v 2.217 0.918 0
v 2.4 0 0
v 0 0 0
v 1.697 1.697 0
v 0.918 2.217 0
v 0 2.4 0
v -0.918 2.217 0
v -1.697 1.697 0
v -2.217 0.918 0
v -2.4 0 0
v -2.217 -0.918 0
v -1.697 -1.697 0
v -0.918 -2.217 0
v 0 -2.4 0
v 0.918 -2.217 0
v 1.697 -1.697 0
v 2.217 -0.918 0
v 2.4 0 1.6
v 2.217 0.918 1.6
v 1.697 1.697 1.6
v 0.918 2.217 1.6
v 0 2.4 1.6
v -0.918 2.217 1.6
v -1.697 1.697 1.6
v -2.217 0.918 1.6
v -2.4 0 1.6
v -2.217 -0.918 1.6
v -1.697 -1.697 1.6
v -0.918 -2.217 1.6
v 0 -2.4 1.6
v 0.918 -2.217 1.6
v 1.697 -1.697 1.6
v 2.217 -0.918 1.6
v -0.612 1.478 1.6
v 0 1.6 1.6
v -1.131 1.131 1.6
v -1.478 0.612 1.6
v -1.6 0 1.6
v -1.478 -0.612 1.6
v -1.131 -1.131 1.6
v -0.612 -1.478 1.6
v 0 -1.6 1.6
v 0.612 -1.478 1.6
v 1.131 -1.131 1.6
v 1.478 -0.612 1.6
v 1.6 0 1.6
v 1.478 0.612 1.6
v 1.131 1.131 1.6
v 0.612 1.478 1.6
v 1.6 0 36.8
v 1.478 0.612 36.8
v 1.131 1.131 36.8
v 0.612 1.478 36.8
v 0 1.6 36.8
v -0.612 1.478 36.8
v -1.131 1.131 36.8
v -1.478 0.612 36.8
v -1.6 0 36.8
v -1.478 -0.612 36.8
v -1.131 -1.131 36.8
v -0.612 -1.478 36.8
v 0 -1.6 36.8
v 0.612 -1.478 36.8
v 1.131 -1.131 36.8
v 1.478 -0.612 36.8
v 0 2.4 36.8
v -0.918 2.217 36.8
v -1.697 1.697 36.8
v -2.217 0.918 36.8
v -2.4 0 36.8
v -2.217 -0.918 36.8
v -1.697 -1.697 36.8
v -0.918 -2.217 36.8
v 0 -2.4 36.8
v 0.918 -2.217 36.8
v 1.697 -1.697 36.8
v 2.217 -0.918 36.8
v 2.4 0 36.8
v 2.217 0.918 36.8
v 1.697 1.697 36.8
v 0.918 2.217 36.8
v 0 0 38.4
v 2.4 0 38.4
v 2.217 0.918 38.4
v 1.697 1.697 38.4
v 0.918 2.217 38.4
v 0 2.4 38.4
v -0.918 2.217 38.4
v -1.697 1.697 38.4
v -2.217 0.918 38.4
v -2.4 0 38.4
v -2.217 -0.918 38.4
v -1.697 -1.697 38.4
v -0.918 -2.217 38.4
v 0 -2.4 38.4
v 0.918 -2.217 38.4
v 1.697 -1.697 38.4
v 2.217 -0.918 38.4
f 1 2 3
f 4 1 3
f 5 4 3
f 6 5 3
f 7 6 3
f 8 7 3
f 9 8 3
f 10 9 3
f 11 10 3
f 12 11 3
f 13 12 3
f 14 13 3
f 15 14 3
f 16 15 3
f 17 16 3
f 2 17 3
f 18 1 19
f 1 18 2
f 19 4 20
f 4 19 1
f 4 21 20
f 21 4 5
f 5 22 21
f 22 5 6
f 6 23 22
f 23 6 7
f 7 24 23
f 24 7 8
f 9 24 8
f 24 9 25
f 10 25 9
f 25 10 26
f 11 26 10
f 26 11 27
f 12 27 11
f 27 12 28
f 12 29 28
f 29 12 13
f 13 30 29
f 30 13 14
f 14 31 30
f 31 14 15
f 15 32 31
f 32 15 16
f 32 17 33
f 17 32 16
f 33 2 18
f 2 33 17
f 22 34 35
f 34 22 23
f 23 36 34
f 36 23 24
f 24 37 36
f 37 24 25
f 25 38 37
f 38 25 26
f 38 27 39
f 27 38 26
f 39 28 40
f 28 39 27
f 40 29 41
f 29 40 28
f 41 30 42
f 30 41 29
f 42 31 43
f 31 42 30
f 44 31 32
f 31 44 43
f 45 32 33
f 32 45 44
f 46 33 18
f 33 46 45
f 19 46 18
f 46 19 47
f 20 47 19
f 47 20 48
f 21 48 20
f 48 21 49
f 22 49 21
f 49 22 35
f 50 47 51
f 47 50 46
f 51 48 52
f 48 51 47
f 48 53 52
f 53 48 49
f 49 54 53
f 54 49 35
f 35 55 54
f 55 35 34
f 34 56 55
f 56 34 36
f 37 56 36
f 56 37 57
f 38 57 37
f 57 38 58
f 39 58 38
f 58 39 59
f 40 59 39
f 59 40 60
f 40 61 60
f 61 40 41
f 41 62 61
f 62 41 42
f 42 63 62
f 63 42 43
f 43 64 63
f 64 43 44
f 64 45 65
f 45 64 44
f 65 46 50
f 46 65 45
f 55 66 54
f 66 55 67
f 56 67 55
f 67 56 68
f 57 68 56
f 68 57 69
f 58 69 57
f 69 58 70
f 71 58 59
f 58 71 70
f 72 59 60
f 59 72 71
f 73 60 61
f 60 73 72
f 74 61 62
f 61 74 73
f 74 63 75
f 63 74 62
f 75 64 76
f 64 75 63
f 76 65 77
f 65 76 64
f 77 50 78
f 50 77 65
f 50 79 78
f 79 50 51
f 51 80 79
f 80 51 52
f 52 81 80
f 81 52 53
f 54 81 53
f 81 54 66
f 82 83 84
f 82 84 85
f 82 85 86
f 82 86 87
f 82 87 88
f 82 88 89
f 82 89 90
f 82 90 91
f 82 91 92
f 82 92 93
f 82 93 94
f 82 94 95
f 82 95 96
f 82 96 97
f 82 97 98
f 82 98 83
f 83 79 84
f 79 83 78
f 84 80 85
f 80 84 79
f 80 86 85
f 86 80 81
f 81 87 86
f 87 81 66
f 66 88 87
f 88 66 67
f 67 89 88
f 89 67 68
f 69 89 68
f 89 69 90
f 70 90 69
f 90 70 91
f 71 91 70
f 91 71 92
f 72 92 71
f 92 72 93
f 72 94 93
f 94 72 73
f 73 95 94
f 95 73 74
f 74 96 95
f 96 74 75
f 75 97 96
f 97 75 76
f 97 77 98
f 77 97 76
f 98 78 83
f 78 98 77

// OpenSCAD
// file: ../p/4-4edge.scad
use <../lib.scad>
function ldraw_lib__4_4edge() = [
// 0 Circle 1.0
// 0 Name: 4-4edge.dat
// 0 Author: James Jessiman
// 0 !LDRAW_ORG Primitive UPDATE 2017-01
// 0 !LICENSE Licensed under CC BY 2.0 and CC BY 4.0 : see CAreadme.txt
// 
// 0 BFC CERTIFY CCW
  [0,"BFC","CERTIFY"],
  [0,"BFC","CCW"],
// 
// 0 !HISTORY 1998-12-15 [PTadmin] Official Update 1998-10
// 0 !HISTORY 2005-12-28 [PTadmin] Official Update 2005-01
// 0 !HISTORY 2007-06-24 [PTadmin] Header formatted for Contributor Agreement
// 0 !HISTORY 2008-07-01 [PTadmin] Official Update 2008-01
// 0 !HISTORY 2017-01-15 [Steffen] BFCed
// 0 !HISTORY 2017-12-30 [PTadmin] Official Update 2017-01
// 
// 
// 2 24 1 0 0 0.9239 0 0.3827
  [2,24,1,0,0,0.9239,0,0.3827],
// 2 24 0.9239 0 0.3827 0.7071 0 0.7071
  [2,24,0.9239,0,0.3827,0.7071,0,0.7071],
// 2 24 0.7071 0 0.7071 0.3827 0 0.9239
  [2,24,0.7071,0,0.7071,0.3827,0,0.9239],
// 2 24 0.3827 0 0.9239 0 0 1
  [2,24,0.3827,0,0.9239,0,0,1],
// 2 24 0 0 1 -0.3827 0 0.9239
  [2,24,0,0,1,-0.3827,0,0.9239],
// 2 24 -0.3827 0 0.9239 -0.7071 0 0.7071
  [2,24,-0.3827,0,0.9239,-0.7071,0,0.7071],
// 2 24 -0.7071 0 0.7071 -0.9239 0 0.3827
  [2,24,-0.7071,0,0.7071,-0.9239,0,0.3827],
// 2 24 -0.9239 0 0.3827 -1 0 -0
  [2,24,-0.9239,0,0.3827,-1,0,-0],
// 2 24 -1 0 -0 -0.9239 0 -0.3827
  [2,24,-1,0,-0,-0.9239,0,-0.3827],
// 2 24 -0.9239 0 -0.3827 -0.7071 0 -0.7071
  [2,24,-0.9239,0,-0.3827,-0.7071,0,-0.7071],
// 2 24 -0.7071 0 -0.7071 -0.3827 0 -0.9239
  [2,24,-0.7071,0,-0.7071,-0.3827,0,-0.9239],
// 2 24 -0.3827 0 -0.9239 0 0 -1
  [2,24,-0.3827,0,-0.9239,0,0,-1],
// 2 24 0 0 -1 0.3827 0 -0.9239
  [2,24,0,0,-1,0.3827,0,-0.9239],
// 2 24 0.3827 0 -0.9239 0.7071 0 -0.7071
  [2,24,0.3827,0,-0.9239,0.7071,0,-0.7071],
// 2 24 0.7071 0 -0.7071 0.9239 0 -0.3827
  [2,24,0.7071,0,-0.7071,0.9239,0,-0.3827],
// 2 24 0.9239 0 -0.3827 1 0 0
  [2,24,0.9239,0,-0.3827,1,0,0],
];
module ldraw_lib__4_4edge(step=0, col=false, unit=2/5, alt=false, line=0.2, solid=!$preview)
    makepoly(ldraw_lib__4_4edge(), step=step, col=col, unit=unit, alt=alt, line=line, solid=solid);
ldraw_lib__4_4edge(line=0.2);
// file: ../p/4-4disc.scad
use <../lib.scad>
function ldraw_lib__4_4disc() = [
// 0 Disc 1.0
// 0 Name: 4-4disc.dat
// 0 Author: James Jessiman
// 0 !LDRAW_ORG Primitive UPDATE 2002-02
// 0 !LICENSE Licensed under CC BY 2.0 and CC BY 4.0 : see CAreadme.txt
// 
// 0 BFC CERTIFY CCW
  [0,"BFC","CERTIFY"],
  [0,"BFC","CCW"],
// 
// 0 !HISTORY 1998-12-15 [PTadmin] Official Update 1998-10
// 0 !HISTORY 2002-03-23 [sbliss] Added BFC statement
// 0 !HISTORY 2002-04-25 [PTadmin] Official Update 2002-02
// 0 !HISTORY 2007-06-24 [PTadmin] Header formatted for Contributor Agreement
// 0 !HISTORY 2008-07-01 [PTadmin] Official Update 2008-01
// 
// 
// 3 16 0 0 0 1 0 0 0.9239 0 0.3827
  [3,16,0,0,0,1,0,0,0.9239,0,0.3827],
// 3 16 0 0 0 0.9239 0 0.3827 0.7071 0 0.7071
  [3,16,0,0,0,0.9239,0,0.3827,0.7071,0,0.7071],
// 3 16 0 0 0 0.7071 0 0.7071 0.3827 0 0.9239
  [3,16,0,0,0,0.7071,0,0.7071,0.3827,0,0.9239],
// 3 16 0 0 0 0.3827 0 0.9239 0 0 1
  [3,16,0,0,0,0.3827,0,0.9239,0,0,1],
// 3 16 0 0 0 0 0 1 -0.3827 0 0.9239
  [3,16,0,0,0,0,0,1,-0.3827,0,0.9239],
// 3 16 0 0 0 -0.3827 0 0.9239 -0.7071 0 0.7071
  [3,16,0,0,0,-0.3827,0,0.9239,-0.7071,0,0.7071],
// 3 16 0 0 0 -0.7071 0 0.7071 -0.9239 0 0.3827
  [3,16,0,0,0,-0.7071,0,0.7071,-0.9239,0,0.3827],
// 3 16 0 0 0 -0.9239 0 0.3827 -1 0 -0
  [3,16,0,0,0,-0.9239,0,0.3827,-1,0,-0],
// 3 16 0 0 0 -1 0 -0 -0.9239 0 -0.3827
  [3,16,0,0,0,-1,0,-0,-0.9239,0,-0.3827],
// 3 16 0 0 0 -0.9239 0 -0.3827 -0.7071 0 -0.7071
  [3,16,0,0,0,-0.9239,0,-0.3827,-0.7071,0,-0.7071],
// 3 16 0 0 0 -0.7071 0 -0.7071 -0.3827 0 -0.9239
  [3,16,0,0,0,-0.7071,0,-0.7071,-0.3827,0,-0.9239],
// 3 16 0 0 0 -0.3827 0 -0.9239 0 0 -1
  [3,16,0,0,0,-0.3827,0,-0.9239,0,0,-1],
// 3 16 0 0 0 0 0 -1 0.3827 0 -0.9239
  [3,16,0,0,0,0,0,-1,0.3827,0,-0.9239],
// 3 16 0 0 0 0.3827 0 -0.9239 0.7071 0 -0.7071
  [3,16,0,0,0,0.3827,0,-0.9239,0.7071,0,-0.7071],
// 3 16 0 0 0 0.7071 0 -0.7071 0.9239 0 -0.3827
  [3,16,0,0,0,0.7071,0,-0.7071,0.9239,0,-0.3827],
// 3 16 0 0 0 0.9239 0 -0.3827 1 0 0
  [3,16,0,0,0,0.9239,0,-0.3827,1,0,0],
// 0
];
module ldraw_lib__4_4disc(step=0, col=false, unit=2/5, alt=false, line=0.2, solid=!$preview)
    makepoly(ldraw_lib__4_4disc(), step=step, col=col, unit=unit, alt=alt, line=line, solid=solid);
ldraw_lib__4_4disc(line=0.2);
// file: ../p/4-4cyli.scad
use <../lib.scad>
function ldraw_lib__4_4cyli() = [
// 0 Cylinder 1.0
// 0 Name: 4-4cyli.dat
// 0 Author: James Jessiman
// 0 !LDRAW_ORG Primitive UPDATE 2005-01
// 0 !LICENSE Licensed under CC BY 2.0 and CC BY 4.0 : see CAreadme.txt
// 
// 0 BFC CERTIFY CCW
  [0,"BFC","CERTIFY"],
  [0,"BFC","CCW"],
// 
// 0 !HISTORY 1998-12-15 [PTadmin] Official Update 1998-10
// 0 !HISTORY 2002-03-23 [sbliss] Added BFC statement; merged headers from files in distributions LDraw 0.27 and Complete.
// 0 !HISTORY 2002-04-25 [PTadmin] Official Update 2002-02
// 0 !HISTORY 2004-12-14 [guyvivan] BFC CCW
// 0 !HISTORY 2005-12-28 [PTadmin] Official Update 2005-01
// 0 !HISTORY 2007-06-24 [PTadmin] Header formatted for Contributor Agreement
// 0 !HISTORY 2008-07-01 [PTadmin] Official Update 2008-01
// 
// 
// 4 16 1 1 0 0.9239 1 0.3827 0.9239 0 0.3827 1 0 0
  [4,16,1,1,0,0.9239,1,0.3827,0.9239,0,0.3827,1,0,0],
// 5 24 1 0 0 1 1 0 0.9239 0 0.3827 0.9239 0 -0.3827
  [5,24,1,0,0,1,1,0,0.9239,0,0.3827,0.9239,0,-0.3827],
// 4 16 0.9239 1 0.3827 0.7071 1 0.7071 0.7071 0 0.7071 0.9239 0 0.3827
  [4,16,0.9239,1,0.3827,0.7071,1,0.7071,0.7071,0,0.7071,0.9239,0,0.3827],
// 5 24 0.9239 0 0.3827 0.9239 1 0.3827 0.7071 0 0.7071 1 0 0
  [5,24,0.9239,0,0.3827,0.9239,1,0.3827,0.7071,0,0.7071,1,0,0],
// 4 16 0.7071 1 0.7071 0.3827 1 0.9239 0.3827 0 0.9239 0.7071 0 0.7071
  [4,16,0.7071,1,0.7071,0.3827,1,0.9239,0.3827,0,0.9239,0.7071,0,0.7071],
// 5 24 0.7071 0 0.7071 0.7071 1 0.7071 0.3827 0 0.9239 0.9239 0 0.3827
  [5,24,0.7071,0,0.7071,0.7071,1,0.7071,0.3827,0,0.9239,0.9239,0,0.3827],
// 4 16 0.3827 1 0.9239 0 1 1 0 0 1 0.3827 0 0.9239
  [4,16,0.3827,1,0.9239,0,1,1,0,0,1,0.3827,0,0.9239],
// 5 24 0.3827 0 0.9239 0.3827 1 0.9239 0 0 1 0.7071 0 0.7071
  [5,24,0.3827,0,0.9239,0.3827,1,0.9239,0,0,1,0.7071,0,0.7071],
// 4 16 0 1 1 -0.3827 1 0.9239 -0.3827 0 0.9239 0 0 1
  [4,16,0,1,1,-0.3827,1,0.9239,-0.3827,0,0.9239,0,0,1],
// 5 24 0 0 1 0 1 1 -0.3827 0 0.9239 0.3827 0 0.9239
  [5,24,0,0,1,0,1,1,-0.3827,0,0.9239,0.3827,0,0.9239],
// 4 16 -0.3827 1 0.9239 -0.7071 1 0.7071 -0.7071 0 0.7071 -0.3827 0 0.9239
  [4,16,-0.3827,1,0.9239,-0.7071,1,0.7071,-0.7071,0,0.7071,-0.3827,0,0.9239],
// 5 24 -0.3827 0 0.9239 -0.3827 1 0.9239 -0.7071 0 0.7071 0 0 1
  [5,24,-0.3827,0,0.9239,-0.3827,1,0.9239,-0.7071,0,0.7071,0,0,1],
// 4 16 -0.7071 1 0.7071 -0.9239 1 0.3827 -0.9239 0 0.3827 -0.7071 0 0.7071
  [4,16,-0.7071,1,0.7071,-0.9239,1,0.3827,-0.9239,0,0.3827,-0.7071,0,0.7071],
// 5 24 -0.7071 0 0.7071 -0.7071 1 0.7071 -0.9239 0 0.3827 -0.3827 0 0.9239
  [5,24,-0.7071,0,0.7071,-0.7071,1,0.7071,-0.9239,0,0.3827,-0.3827,0,0.9239],
// 4 16 -0.9239 1 0.3827 -1 1 0 -1 0 0 -0.9239 0 0.3827
  [4,16,-0.9239,1,0.3827,-1,1,0,-1,0,0,-0.9239,0,0.3827],
// 5 24 -0.9239 0 0.3827 -0.9239 1 0.3827 -1 0 0 -0.7071 0 0.7071
  [5,24,-0.9239,0,0.3827,-0.9239,1,0.3827,-1,0,0,-0.7071,0,0.7071],
// 4 16 -1 1 0 -0.9239 1 -0.3827 -0.9239 0 -0.3827 -1 0 0
  [4,16,-1,1,0,-0.9239,1,-0.3827,-0.9239,0,-0.3827,-1,0,0],
// 5 24 -1 0 0 -1 1 0 -0.9239 0 -0.3827 -0.9239 0 0.3827
  [5,24,-1,0,0,-1,1,0,-0.9239,0,-0.3827,-0.9239,0,0.3827],
// 4 16 -0.9239 1 -0.3827 -0.7071 1 -0.7071 -0.7071 0 -0.7071 -0.9239 0 -0.3827
  [4,16,-0.9239,1,-0.3827,-0.7071,1,-0.7071,-0.7071,0,-0.7071,-0.9239,0,-0.3827],
// 5 24 -0.9239 0 -0.3827 -0.9239 1 -0.3827 -0.7071 0 -0.7071 -1 0 0
  [5,24,-0.9239,0,-0.3827,-0.9239,1,-0.3827,-0.7071,0,-0.7071,-1,0,0],
// 4 16 -0.7071 1 -0.7071 -0.3827 1 -0.9239 -0.3827 0 -0.9239 -0.7071 0 -0.7071
  [4,16,-0.7071,1,-0.7071,-0.3827,1,-0.9239,-0.3827,0,-0.9239,-0.7071,0,-0.7071],
// 5 24 -0.7071 0 -0.7071 -0.7071 1 -0.7071 -0.3827 0 -0.9239 -0.9239 0 -0.3827
  [5,24,-0.7071,0,-0.7071,-0.7071,1,-0.7071,-0.3827,0,-0.9239,-0.9239,0,-0.3827],
// 4 16 -0.3827 1 -0.9239 0 1 -1 0 0 -1 -0.3827 0 -0.9239
  [4,16,-0.3827,1,-0.9239,0,1,-1,0,0,-1,-0.3827,0,-0.9239],
// 5 24 -0.3827 0 -0.9239 -0.3827 1 -0.9239 0 0 -1 -0.7071 0 -0.7071
  [5,24,-0.3827,0,-0.9239,-0.3827,1,-0.9239,0,0,-1,-0.7071,0,-0.7071],
// 4 16 0 1 -1 0.3827 1 -0.9239 0.3827 0 -0.9239 0 0 -1
  [4,16,0,1,-1,0.3827,1,-0.9239,0.3827,0,-0.9239,0,0,-1],
// 5 24 0 0 -1 0 1 -1 0.3827 0 -0.9239 -0.3827 0 -0.9239
  [5,24,0,0,-1,0,1,-1,0.3827,0,-0.9239,-0.3827,0,-0.9239],
// 4 16 0.3827 1 -0.9239 0.7071 1 -0.7071 0.7071 0 -0.7071 0.3827 0 -0.9239
  [4,16,0.3827,1,-0.9239,0.7071,1,-0.7071,0.7071,0,-0.7071,0.3827,0,-0.9239],
// 5 24 0.3827 0 -0.9239 0.3827 1 -0.9239 0.7071 0 -0.7071 0 0 -1
  [5,24,0.3827,0,-0.9239,0.3827,1,-0.9239,0.7071,0,-0.7071,0,0,-1],
// 4 16 0.7071 1 -0.7071 0.9239 1 -0.3827 0.9239 0 -0.3827 0.7071 0 -0.7071
  [4,16,0.7071,1,-0.7071,0.9239,1,-0.3827,0.9239,0,-0.3827,0.7071,0,-0.7071],
// 5 24 0.7071 0 -0.7071 0.7071 1 -0.7071 0.9239 0 -0.3827 0.3827 0 -0.9239
  [5,24,0.7071,0,-0.7071,0.7071,1,-0.7071,0.9239,0,-0.3827,0.3827,0,-0.9239],
// 4 16 0.9239 1 -0.3827 1 1 0 1 0 0 0.9239 0 -0.3827
  [4,16,0.9239,1,-0.3827,1,1,0,1,0,0,0.9239,0,-0.3827],
// 5 24 0.9239 0 -0.3827 0.9239 1 -0.3827 1 0 0 0.7071 0 -0.7071
  [5,24,0.9239,0,-0.3827,0.9239,1,-0.3827,1,0,0,0.7071,0,-0.7071],
// 0
];
module ldraw_lib__4_4cyli(step=0, col=false, unit=2/5, alt=false, line=0.2, solid=!$preview)
    makepoly(ldraw_lib__4_4cyli(), step=step, col=col, unit=unit, alt=alt, line=line, solid=solid);
ldraw_lib__4_4cyli(line=0.2);
// file: ../p/4-4ring2.scad
use <../lib.scad>
function ldraw_lib__4_4ring2() = [
// 0 Ring  2 x 1.0
// 0 Name: 4-4ring2.dat
// 0 Author: James Jessiman
// 0 !LDRAW_ORG Primitive UPDATE 2009-01
// 0 !LICENSE Licensed under CC BY 2.0 and CC BY 4.0 : see CAreadme.txt
// 
// 0 BFC CERTIFY CCW
  [0,"BFC","CERTIFY"],
  [0,"BFC","CCW"],
// 
// 0 !HISTORY 1998-12-15 [PTadmin] Official Update 1998-10
// 0 !HISTORY 2002-04-05 [hafhead] Added BFC statement
// 0 !HISTORY 2002-04-25 [PTadmin] Official Update 2002-02
// 0 !HISTORY 2007-06-24 [PTadmin] Header formatted for Contributor Agreement
// 0 !HISTORY 2008-07-01 [PTadmin] Official Update 2008-01
// 0 !HISTORY 2008-08-26 [cwdee] Switch polygon winding and rename
// 0 !HISTORY 2009-05-02 [PTadmin] Official Update 2009-01
// 
// 
// 4 16 -1.1481 0 2.7717 -0.7654 0 1.8478 0 0 2 0 0 3
  [4,16,-1.1481,0,2.7717,-0.7654,0,1.8478,0,0,2,0,0,3],
// 4 16 -2.1213 0 2.1213 -1.4142 0 1.4142 -0.7654 0 1.8478 -1.1481 0 2.7717
  [4,16,-2.1213,0,2.1213,-1.4142,0,1.4142,-0.7654,0,1.8478,-1.1481,0,2.7717],
// 4 16 -2.7717 0 1.1481 -1.8478 0 0.7654 -1.4142 0 1.4142 -2.1213 0 2.1213
  [4,16,-2.7717,0,1.1481,-1.8478,0,0.7654,-1.4142,0,1.4142,-2.1213,0,2.1213],
// 4 16 -3 0 0 -2 0 0 -1.8478 0 0.7654 -2.7717 0 1.1481
  [4,16,-3,0,0,-2,0,0,-1.8478,0,0.7654,-2.7717,0,1.1481],
// 4 16 -2.7717 0 -1.1481 -1.8478 0 -0.7654 -2 0 0 -3 0 0
  [4,16,-2.7717,0,-1.1481,-1.8478,0,-0.7654,-2,0,0,-3,0,0],
// 4 16 -2.1213 0 -2.1213 -1.4142 0 -1.4142 -1.8478 0 -0.7654 -2.7717 0 -1.1481
  [4,16,-2.1213,0,-2.1213,-1.4142,0,-1.4142,-1.8478,0,-0.7654,-2.7717,0,-1.1481],
// 4 16 -1.1481 0 -2.7717 -0.7654 0 -1.8478 -1.4142 0 -1.4142 -2.1213 0 -2.1213
  [4,16,-1.1481,0,-2.7717,-0.7654,0,-1.8478,-1.4142,0,-1.4142,-2.1213,0,-2.1213],
// 4 16 0 0 -3 0 0 -2 -0.7654 0 -1.8478 -1.1481 0 -2.7717
  [4,16,0,0,-3,0,0,-2,-0.7654,0,-1.8478,-1.1481,0,-2.7717],
// 4 16 1.1481 0 -2.7717 0.7654 0 -1.8478 0 0 -2 0 0 -3
  [4,16,1.1481,0,-2.7717,0.7654,0,-1.8478,0,0,-2,0,0,-3],
// 4 16 2.1213 0 -2.1213 1.4142 0 -1.4142 0.7654 0 -1.8478 1.1481 0 -2.7717
  [4,16,2.1213,0,-2.1213,1.4142,0,-1.4142,0.7654,0,-1.8478,1.1481,0,-2.7717],
// 4 16 2.7717 0 -1.1481 1.8478 0 -0.7654 1.4142 0 -1.4142 2.1213 0 -2.1213
  [4,16,2.7717,0,-1.1481,1.8478,0,-0.7654,1.4142,0,-1.4142,2.1213,0,-2.1213],
// 4 16 3 0 0 2 0 0 1.8478 0 -0.7654 2.7717 0 -1.1481
  [4,16,3,0,0,2,0,0,1.8478,0,-0.7654,2.7717,0,-1.1481],
// 4 16 2.7717 0 1.1481 1.8478 0 0.7654 2 0 0 3 0 0
  [4,16,2.7717,0,1.1481,1.8478,0,0.7654,2,0,0,3,0,0],
// 4 16 2.1213 0 2.1213 1.4142 0 1.4142 1.8478 0 0.7654 2.7717 0 1.1481
  [4,16,2.1213,0,2.1213,1.4142,0,1.4142,1.8478,0,0.7654,2.7717,0,1.1481],
// 4 16 1.1481 0 2.7717 0.7654 0 1.8478 1.4142 0 1.4142 2.1213 0 2.1213
  [4,16,1.1481,0,2.7717,0.7654,0,1.8478,1.4142,0,1.4142,2.1213,0,2.1213],
// 4 16 0 0 3 0 0 2 0.7654 0 1.8478 1.1481 0 2.7717
  [4,16,0,0,3,0,0,2,0.7654,0,1.8478,1.1481,0,2.7717],
// 0
];
module ldraw_lib__4_4ring2(step=0, col=false, unit=2/5, alt=false, line=0.2, solid=!$preview)
    makepoly(ldraw_lib__4_4ring2(), step=step, col=col, unit=unit, alt=alt, line=line, solid=solid);
ldraw_lib__4_4ring2(line=0.2);
// file: ../p/4-4cylo.scad
use <../lib.scad>
use <4-4cyli.scad>
use <4-4edge.scad>
function ldraw_lib__4_4cylo() = [
// 0 Cylinder Open 1.0
// 0 Name: 4-4cylo.dat
// 0 Author: Mark Kennedy [mkennedy]
// 0 !LDRAW_ORG Primitive UPDATE 2010-01
// 0 !LICENSE Licensed under CC BY 2.0 and CC BY 4.0 : see CAreadme.txt
// 
// 0 BFC CERTIFY CCW
  [0,"BFC","CERTIFY"],
  [0,"BFC","CCW"],
// 
// 0 !HISTORY 2010-04-05 [PTadmin] Official Update 2010-01
// 
// 
// 1 16 0 0 0 1 0 0 0 1 0 0 0 1 4-4edge.dat
  [1,16,0,0,0,1,0,0,0,1,0,0,0,1, ldraw_lib__4_4edge()],
// 1 16 0 1 0 1 0 0 0 1 0 0 0 1 4-4edge.dat
  [1,16,0,1,0,1,0,0,0,1,0,0,0,1, ldraw_lib__4_4edge()],
// 1 16 0 0 0 1 0 0 0 1 0 0 0 1 4-4cyli.dat
  [1,16,0,0,0,1,0,0,0,1,0,0,0,1, ldraw_lib__4_4cyli()],
// 0
];
module ldraw_lib__4_4cylo(step=0, col=false, unit=2/5, alt=false, line=0.2, solid=!$preview)
    makepoly(ldraw_lib__4_4cylo(), step=step, col=col, unit=unit, alt=alt, line=line, solid=solid);
ldraw_lib__4_4cylo(line=0.2);
// file: ../p/4-4cylc.scad
use <../lib.scad>
use <4-4cyli.scad>
use <4-4disc.scad>
use <4-4edge.scad>
function ldraw_lib__4_4cylc() = [
// 0 Cylinder Closed 1.0
// 0 Name: 4-4cylc.dat
// 0 Author: Alex Taylor [anathema]
// 0 !LDRAW_ORG Primitive UPDATE 2009-02
// 0 !LICENSE Licensed under CC BY 2.0 and CC BY 4.0 : see CAreadme.txt
// 
// 0 BFC CERTIFY CCW
  [0,"BFC","CERTIFY"],
  [0,"BFC","CCW"],
// 
// 0 !HISTORY 2008-12-29 [cwdee] Removed one disc
// 0 !HISTORY 2009-09-03 [PTadmin] Official Update 2009-02
// 
// 
// 1 16 0 0 0 1 0 0 0 1 0 0 0 1 4-4edge.dat
  [1,16,0,0,0,1,0,0,0,1,0,0,0,1, ldraw_lib__4_4edge()],
// 1 16 0 1 0 1 0 0 0 1 0 0 0 1 4-4edge.dat
  [1,16,0,1,0,1,0,0,0,1,0,0,0,1, ldraw_lib__4_4edge()],
// 1 16 0 0 0 1 0 0 0 1 0 0 0 1 4-4disc.dat
  [1,16,0,0,0,1,0,0,0,1,0,0,0,1, ldraw_lib__4_4disc()],
// 1 16 0 0 0 1 0 0 0 1 0 0 0 1 4-4cyli.dat
  [1,16,0,0,0,1,0,0,0,1,0,0,0,1, ldraw_lib__4_4cyli()],
// 0
];
module ldraw_lib__4_4cylc(step=0, col=false, unit=2/5, alt=false, line=0.2, solid=!$preview)
    makepoly(ldraw_lib__4_4cylc(), step=step, col=col, unit=unit, alt=alt, line=line, solid=solid);
ldraw_lib__4_4cylc(line=0.2);
// main file
use <../lib.scad>
use <../p/4-4cylc.scad>
use <../p/4-4cylo.scad>
use <../p/4-4ring2.scad>
function ldraw_lib__71184() = [
// 0 Bar  4.5L Straight
// 0 Name: 71184.dat
// 0 Author: Thomas Burger [grapeape]
// 0 !LDRAW_ORG Part UPDATE 2018-01
// 0 !LICENSE Licensed under CC BY 2.0 and CC BY 4.0 : see CAreadme.txt
// 
// 0 BFC CERTIFY CCW
  [0,"BFC","CERTIFY"],
  [0,"BFC","CCW"],
// 
// 0 !HISTORY 1998-07-15 [PTadmin] Official Update 1998-07
// 0 !HISTORY 2000-04-23 [sbliss] Corrected length, rectified singular reference matrices
// 0 !HISTORY 2000-05-07 [PTadmin] Official Update 2000-01
// 0 !HISTORY 2007-10-12 [PTadmin] Header formatted for Contributor Agreement
// 0 !HISTORY 2008-07-01 [PTadmin] Official Update 2008-01
// 0 !HISTORY 2017-09-23 [MagFors] bfc'd
// 0 !HISTORY 2018-01-30 [PTadmin] Official Update 2018-01
// 
// 
// 1 16 0 0 0 6 0 0 0 -4 0 0 0 6 4-4cylc.dat
  [1,16,0,0,0,6,0,0,0,-4,0,0,0,6, ldraw_lib__4_4cylc()],
// 1 16 0 -4 0 2 0 0 0 1 0 0 0 2 4-4ring2.dat
  [1,16,0,-4,0,2,0,0,0,1,0,0,0,2, ldraw_lib__4_4ring2()],
// 1 16 0 -92 0 4 0 0 0 88 0 0 0 4 4-4cylo.dat
  [1,16,0,-92,0,4,0,0,0,88,0,0,0,4, ldraw_lib__4_4cylo()],
// 1 16 0 -92 0 2 0 0 0 -1 0 0 0 2 4-4ring2.dat
  [1,16,0,-92,0,2,0,0,0,-1,0,0,0,2, ldraw_lib__4_4ring2()],
// 1 16 0 -96 0 6 0 0 0 4 0 0 0 6 4-4cylc.dat
  [1,16,0,-96,0,6,0,0,0,4,0,0,0,6, ldraw_lib__4_4cylc()],
];
module ldraw_lib__71184(step=0, col=false, unit=2/5, alt=false, line=0.2, solid=!$preview)
    makepoly(ldraw_lib__71184(), step=step, col=col, unit=unit, alt=alt, line=line, solid=solid);
ldraw_lib__71184(line=0.2);
